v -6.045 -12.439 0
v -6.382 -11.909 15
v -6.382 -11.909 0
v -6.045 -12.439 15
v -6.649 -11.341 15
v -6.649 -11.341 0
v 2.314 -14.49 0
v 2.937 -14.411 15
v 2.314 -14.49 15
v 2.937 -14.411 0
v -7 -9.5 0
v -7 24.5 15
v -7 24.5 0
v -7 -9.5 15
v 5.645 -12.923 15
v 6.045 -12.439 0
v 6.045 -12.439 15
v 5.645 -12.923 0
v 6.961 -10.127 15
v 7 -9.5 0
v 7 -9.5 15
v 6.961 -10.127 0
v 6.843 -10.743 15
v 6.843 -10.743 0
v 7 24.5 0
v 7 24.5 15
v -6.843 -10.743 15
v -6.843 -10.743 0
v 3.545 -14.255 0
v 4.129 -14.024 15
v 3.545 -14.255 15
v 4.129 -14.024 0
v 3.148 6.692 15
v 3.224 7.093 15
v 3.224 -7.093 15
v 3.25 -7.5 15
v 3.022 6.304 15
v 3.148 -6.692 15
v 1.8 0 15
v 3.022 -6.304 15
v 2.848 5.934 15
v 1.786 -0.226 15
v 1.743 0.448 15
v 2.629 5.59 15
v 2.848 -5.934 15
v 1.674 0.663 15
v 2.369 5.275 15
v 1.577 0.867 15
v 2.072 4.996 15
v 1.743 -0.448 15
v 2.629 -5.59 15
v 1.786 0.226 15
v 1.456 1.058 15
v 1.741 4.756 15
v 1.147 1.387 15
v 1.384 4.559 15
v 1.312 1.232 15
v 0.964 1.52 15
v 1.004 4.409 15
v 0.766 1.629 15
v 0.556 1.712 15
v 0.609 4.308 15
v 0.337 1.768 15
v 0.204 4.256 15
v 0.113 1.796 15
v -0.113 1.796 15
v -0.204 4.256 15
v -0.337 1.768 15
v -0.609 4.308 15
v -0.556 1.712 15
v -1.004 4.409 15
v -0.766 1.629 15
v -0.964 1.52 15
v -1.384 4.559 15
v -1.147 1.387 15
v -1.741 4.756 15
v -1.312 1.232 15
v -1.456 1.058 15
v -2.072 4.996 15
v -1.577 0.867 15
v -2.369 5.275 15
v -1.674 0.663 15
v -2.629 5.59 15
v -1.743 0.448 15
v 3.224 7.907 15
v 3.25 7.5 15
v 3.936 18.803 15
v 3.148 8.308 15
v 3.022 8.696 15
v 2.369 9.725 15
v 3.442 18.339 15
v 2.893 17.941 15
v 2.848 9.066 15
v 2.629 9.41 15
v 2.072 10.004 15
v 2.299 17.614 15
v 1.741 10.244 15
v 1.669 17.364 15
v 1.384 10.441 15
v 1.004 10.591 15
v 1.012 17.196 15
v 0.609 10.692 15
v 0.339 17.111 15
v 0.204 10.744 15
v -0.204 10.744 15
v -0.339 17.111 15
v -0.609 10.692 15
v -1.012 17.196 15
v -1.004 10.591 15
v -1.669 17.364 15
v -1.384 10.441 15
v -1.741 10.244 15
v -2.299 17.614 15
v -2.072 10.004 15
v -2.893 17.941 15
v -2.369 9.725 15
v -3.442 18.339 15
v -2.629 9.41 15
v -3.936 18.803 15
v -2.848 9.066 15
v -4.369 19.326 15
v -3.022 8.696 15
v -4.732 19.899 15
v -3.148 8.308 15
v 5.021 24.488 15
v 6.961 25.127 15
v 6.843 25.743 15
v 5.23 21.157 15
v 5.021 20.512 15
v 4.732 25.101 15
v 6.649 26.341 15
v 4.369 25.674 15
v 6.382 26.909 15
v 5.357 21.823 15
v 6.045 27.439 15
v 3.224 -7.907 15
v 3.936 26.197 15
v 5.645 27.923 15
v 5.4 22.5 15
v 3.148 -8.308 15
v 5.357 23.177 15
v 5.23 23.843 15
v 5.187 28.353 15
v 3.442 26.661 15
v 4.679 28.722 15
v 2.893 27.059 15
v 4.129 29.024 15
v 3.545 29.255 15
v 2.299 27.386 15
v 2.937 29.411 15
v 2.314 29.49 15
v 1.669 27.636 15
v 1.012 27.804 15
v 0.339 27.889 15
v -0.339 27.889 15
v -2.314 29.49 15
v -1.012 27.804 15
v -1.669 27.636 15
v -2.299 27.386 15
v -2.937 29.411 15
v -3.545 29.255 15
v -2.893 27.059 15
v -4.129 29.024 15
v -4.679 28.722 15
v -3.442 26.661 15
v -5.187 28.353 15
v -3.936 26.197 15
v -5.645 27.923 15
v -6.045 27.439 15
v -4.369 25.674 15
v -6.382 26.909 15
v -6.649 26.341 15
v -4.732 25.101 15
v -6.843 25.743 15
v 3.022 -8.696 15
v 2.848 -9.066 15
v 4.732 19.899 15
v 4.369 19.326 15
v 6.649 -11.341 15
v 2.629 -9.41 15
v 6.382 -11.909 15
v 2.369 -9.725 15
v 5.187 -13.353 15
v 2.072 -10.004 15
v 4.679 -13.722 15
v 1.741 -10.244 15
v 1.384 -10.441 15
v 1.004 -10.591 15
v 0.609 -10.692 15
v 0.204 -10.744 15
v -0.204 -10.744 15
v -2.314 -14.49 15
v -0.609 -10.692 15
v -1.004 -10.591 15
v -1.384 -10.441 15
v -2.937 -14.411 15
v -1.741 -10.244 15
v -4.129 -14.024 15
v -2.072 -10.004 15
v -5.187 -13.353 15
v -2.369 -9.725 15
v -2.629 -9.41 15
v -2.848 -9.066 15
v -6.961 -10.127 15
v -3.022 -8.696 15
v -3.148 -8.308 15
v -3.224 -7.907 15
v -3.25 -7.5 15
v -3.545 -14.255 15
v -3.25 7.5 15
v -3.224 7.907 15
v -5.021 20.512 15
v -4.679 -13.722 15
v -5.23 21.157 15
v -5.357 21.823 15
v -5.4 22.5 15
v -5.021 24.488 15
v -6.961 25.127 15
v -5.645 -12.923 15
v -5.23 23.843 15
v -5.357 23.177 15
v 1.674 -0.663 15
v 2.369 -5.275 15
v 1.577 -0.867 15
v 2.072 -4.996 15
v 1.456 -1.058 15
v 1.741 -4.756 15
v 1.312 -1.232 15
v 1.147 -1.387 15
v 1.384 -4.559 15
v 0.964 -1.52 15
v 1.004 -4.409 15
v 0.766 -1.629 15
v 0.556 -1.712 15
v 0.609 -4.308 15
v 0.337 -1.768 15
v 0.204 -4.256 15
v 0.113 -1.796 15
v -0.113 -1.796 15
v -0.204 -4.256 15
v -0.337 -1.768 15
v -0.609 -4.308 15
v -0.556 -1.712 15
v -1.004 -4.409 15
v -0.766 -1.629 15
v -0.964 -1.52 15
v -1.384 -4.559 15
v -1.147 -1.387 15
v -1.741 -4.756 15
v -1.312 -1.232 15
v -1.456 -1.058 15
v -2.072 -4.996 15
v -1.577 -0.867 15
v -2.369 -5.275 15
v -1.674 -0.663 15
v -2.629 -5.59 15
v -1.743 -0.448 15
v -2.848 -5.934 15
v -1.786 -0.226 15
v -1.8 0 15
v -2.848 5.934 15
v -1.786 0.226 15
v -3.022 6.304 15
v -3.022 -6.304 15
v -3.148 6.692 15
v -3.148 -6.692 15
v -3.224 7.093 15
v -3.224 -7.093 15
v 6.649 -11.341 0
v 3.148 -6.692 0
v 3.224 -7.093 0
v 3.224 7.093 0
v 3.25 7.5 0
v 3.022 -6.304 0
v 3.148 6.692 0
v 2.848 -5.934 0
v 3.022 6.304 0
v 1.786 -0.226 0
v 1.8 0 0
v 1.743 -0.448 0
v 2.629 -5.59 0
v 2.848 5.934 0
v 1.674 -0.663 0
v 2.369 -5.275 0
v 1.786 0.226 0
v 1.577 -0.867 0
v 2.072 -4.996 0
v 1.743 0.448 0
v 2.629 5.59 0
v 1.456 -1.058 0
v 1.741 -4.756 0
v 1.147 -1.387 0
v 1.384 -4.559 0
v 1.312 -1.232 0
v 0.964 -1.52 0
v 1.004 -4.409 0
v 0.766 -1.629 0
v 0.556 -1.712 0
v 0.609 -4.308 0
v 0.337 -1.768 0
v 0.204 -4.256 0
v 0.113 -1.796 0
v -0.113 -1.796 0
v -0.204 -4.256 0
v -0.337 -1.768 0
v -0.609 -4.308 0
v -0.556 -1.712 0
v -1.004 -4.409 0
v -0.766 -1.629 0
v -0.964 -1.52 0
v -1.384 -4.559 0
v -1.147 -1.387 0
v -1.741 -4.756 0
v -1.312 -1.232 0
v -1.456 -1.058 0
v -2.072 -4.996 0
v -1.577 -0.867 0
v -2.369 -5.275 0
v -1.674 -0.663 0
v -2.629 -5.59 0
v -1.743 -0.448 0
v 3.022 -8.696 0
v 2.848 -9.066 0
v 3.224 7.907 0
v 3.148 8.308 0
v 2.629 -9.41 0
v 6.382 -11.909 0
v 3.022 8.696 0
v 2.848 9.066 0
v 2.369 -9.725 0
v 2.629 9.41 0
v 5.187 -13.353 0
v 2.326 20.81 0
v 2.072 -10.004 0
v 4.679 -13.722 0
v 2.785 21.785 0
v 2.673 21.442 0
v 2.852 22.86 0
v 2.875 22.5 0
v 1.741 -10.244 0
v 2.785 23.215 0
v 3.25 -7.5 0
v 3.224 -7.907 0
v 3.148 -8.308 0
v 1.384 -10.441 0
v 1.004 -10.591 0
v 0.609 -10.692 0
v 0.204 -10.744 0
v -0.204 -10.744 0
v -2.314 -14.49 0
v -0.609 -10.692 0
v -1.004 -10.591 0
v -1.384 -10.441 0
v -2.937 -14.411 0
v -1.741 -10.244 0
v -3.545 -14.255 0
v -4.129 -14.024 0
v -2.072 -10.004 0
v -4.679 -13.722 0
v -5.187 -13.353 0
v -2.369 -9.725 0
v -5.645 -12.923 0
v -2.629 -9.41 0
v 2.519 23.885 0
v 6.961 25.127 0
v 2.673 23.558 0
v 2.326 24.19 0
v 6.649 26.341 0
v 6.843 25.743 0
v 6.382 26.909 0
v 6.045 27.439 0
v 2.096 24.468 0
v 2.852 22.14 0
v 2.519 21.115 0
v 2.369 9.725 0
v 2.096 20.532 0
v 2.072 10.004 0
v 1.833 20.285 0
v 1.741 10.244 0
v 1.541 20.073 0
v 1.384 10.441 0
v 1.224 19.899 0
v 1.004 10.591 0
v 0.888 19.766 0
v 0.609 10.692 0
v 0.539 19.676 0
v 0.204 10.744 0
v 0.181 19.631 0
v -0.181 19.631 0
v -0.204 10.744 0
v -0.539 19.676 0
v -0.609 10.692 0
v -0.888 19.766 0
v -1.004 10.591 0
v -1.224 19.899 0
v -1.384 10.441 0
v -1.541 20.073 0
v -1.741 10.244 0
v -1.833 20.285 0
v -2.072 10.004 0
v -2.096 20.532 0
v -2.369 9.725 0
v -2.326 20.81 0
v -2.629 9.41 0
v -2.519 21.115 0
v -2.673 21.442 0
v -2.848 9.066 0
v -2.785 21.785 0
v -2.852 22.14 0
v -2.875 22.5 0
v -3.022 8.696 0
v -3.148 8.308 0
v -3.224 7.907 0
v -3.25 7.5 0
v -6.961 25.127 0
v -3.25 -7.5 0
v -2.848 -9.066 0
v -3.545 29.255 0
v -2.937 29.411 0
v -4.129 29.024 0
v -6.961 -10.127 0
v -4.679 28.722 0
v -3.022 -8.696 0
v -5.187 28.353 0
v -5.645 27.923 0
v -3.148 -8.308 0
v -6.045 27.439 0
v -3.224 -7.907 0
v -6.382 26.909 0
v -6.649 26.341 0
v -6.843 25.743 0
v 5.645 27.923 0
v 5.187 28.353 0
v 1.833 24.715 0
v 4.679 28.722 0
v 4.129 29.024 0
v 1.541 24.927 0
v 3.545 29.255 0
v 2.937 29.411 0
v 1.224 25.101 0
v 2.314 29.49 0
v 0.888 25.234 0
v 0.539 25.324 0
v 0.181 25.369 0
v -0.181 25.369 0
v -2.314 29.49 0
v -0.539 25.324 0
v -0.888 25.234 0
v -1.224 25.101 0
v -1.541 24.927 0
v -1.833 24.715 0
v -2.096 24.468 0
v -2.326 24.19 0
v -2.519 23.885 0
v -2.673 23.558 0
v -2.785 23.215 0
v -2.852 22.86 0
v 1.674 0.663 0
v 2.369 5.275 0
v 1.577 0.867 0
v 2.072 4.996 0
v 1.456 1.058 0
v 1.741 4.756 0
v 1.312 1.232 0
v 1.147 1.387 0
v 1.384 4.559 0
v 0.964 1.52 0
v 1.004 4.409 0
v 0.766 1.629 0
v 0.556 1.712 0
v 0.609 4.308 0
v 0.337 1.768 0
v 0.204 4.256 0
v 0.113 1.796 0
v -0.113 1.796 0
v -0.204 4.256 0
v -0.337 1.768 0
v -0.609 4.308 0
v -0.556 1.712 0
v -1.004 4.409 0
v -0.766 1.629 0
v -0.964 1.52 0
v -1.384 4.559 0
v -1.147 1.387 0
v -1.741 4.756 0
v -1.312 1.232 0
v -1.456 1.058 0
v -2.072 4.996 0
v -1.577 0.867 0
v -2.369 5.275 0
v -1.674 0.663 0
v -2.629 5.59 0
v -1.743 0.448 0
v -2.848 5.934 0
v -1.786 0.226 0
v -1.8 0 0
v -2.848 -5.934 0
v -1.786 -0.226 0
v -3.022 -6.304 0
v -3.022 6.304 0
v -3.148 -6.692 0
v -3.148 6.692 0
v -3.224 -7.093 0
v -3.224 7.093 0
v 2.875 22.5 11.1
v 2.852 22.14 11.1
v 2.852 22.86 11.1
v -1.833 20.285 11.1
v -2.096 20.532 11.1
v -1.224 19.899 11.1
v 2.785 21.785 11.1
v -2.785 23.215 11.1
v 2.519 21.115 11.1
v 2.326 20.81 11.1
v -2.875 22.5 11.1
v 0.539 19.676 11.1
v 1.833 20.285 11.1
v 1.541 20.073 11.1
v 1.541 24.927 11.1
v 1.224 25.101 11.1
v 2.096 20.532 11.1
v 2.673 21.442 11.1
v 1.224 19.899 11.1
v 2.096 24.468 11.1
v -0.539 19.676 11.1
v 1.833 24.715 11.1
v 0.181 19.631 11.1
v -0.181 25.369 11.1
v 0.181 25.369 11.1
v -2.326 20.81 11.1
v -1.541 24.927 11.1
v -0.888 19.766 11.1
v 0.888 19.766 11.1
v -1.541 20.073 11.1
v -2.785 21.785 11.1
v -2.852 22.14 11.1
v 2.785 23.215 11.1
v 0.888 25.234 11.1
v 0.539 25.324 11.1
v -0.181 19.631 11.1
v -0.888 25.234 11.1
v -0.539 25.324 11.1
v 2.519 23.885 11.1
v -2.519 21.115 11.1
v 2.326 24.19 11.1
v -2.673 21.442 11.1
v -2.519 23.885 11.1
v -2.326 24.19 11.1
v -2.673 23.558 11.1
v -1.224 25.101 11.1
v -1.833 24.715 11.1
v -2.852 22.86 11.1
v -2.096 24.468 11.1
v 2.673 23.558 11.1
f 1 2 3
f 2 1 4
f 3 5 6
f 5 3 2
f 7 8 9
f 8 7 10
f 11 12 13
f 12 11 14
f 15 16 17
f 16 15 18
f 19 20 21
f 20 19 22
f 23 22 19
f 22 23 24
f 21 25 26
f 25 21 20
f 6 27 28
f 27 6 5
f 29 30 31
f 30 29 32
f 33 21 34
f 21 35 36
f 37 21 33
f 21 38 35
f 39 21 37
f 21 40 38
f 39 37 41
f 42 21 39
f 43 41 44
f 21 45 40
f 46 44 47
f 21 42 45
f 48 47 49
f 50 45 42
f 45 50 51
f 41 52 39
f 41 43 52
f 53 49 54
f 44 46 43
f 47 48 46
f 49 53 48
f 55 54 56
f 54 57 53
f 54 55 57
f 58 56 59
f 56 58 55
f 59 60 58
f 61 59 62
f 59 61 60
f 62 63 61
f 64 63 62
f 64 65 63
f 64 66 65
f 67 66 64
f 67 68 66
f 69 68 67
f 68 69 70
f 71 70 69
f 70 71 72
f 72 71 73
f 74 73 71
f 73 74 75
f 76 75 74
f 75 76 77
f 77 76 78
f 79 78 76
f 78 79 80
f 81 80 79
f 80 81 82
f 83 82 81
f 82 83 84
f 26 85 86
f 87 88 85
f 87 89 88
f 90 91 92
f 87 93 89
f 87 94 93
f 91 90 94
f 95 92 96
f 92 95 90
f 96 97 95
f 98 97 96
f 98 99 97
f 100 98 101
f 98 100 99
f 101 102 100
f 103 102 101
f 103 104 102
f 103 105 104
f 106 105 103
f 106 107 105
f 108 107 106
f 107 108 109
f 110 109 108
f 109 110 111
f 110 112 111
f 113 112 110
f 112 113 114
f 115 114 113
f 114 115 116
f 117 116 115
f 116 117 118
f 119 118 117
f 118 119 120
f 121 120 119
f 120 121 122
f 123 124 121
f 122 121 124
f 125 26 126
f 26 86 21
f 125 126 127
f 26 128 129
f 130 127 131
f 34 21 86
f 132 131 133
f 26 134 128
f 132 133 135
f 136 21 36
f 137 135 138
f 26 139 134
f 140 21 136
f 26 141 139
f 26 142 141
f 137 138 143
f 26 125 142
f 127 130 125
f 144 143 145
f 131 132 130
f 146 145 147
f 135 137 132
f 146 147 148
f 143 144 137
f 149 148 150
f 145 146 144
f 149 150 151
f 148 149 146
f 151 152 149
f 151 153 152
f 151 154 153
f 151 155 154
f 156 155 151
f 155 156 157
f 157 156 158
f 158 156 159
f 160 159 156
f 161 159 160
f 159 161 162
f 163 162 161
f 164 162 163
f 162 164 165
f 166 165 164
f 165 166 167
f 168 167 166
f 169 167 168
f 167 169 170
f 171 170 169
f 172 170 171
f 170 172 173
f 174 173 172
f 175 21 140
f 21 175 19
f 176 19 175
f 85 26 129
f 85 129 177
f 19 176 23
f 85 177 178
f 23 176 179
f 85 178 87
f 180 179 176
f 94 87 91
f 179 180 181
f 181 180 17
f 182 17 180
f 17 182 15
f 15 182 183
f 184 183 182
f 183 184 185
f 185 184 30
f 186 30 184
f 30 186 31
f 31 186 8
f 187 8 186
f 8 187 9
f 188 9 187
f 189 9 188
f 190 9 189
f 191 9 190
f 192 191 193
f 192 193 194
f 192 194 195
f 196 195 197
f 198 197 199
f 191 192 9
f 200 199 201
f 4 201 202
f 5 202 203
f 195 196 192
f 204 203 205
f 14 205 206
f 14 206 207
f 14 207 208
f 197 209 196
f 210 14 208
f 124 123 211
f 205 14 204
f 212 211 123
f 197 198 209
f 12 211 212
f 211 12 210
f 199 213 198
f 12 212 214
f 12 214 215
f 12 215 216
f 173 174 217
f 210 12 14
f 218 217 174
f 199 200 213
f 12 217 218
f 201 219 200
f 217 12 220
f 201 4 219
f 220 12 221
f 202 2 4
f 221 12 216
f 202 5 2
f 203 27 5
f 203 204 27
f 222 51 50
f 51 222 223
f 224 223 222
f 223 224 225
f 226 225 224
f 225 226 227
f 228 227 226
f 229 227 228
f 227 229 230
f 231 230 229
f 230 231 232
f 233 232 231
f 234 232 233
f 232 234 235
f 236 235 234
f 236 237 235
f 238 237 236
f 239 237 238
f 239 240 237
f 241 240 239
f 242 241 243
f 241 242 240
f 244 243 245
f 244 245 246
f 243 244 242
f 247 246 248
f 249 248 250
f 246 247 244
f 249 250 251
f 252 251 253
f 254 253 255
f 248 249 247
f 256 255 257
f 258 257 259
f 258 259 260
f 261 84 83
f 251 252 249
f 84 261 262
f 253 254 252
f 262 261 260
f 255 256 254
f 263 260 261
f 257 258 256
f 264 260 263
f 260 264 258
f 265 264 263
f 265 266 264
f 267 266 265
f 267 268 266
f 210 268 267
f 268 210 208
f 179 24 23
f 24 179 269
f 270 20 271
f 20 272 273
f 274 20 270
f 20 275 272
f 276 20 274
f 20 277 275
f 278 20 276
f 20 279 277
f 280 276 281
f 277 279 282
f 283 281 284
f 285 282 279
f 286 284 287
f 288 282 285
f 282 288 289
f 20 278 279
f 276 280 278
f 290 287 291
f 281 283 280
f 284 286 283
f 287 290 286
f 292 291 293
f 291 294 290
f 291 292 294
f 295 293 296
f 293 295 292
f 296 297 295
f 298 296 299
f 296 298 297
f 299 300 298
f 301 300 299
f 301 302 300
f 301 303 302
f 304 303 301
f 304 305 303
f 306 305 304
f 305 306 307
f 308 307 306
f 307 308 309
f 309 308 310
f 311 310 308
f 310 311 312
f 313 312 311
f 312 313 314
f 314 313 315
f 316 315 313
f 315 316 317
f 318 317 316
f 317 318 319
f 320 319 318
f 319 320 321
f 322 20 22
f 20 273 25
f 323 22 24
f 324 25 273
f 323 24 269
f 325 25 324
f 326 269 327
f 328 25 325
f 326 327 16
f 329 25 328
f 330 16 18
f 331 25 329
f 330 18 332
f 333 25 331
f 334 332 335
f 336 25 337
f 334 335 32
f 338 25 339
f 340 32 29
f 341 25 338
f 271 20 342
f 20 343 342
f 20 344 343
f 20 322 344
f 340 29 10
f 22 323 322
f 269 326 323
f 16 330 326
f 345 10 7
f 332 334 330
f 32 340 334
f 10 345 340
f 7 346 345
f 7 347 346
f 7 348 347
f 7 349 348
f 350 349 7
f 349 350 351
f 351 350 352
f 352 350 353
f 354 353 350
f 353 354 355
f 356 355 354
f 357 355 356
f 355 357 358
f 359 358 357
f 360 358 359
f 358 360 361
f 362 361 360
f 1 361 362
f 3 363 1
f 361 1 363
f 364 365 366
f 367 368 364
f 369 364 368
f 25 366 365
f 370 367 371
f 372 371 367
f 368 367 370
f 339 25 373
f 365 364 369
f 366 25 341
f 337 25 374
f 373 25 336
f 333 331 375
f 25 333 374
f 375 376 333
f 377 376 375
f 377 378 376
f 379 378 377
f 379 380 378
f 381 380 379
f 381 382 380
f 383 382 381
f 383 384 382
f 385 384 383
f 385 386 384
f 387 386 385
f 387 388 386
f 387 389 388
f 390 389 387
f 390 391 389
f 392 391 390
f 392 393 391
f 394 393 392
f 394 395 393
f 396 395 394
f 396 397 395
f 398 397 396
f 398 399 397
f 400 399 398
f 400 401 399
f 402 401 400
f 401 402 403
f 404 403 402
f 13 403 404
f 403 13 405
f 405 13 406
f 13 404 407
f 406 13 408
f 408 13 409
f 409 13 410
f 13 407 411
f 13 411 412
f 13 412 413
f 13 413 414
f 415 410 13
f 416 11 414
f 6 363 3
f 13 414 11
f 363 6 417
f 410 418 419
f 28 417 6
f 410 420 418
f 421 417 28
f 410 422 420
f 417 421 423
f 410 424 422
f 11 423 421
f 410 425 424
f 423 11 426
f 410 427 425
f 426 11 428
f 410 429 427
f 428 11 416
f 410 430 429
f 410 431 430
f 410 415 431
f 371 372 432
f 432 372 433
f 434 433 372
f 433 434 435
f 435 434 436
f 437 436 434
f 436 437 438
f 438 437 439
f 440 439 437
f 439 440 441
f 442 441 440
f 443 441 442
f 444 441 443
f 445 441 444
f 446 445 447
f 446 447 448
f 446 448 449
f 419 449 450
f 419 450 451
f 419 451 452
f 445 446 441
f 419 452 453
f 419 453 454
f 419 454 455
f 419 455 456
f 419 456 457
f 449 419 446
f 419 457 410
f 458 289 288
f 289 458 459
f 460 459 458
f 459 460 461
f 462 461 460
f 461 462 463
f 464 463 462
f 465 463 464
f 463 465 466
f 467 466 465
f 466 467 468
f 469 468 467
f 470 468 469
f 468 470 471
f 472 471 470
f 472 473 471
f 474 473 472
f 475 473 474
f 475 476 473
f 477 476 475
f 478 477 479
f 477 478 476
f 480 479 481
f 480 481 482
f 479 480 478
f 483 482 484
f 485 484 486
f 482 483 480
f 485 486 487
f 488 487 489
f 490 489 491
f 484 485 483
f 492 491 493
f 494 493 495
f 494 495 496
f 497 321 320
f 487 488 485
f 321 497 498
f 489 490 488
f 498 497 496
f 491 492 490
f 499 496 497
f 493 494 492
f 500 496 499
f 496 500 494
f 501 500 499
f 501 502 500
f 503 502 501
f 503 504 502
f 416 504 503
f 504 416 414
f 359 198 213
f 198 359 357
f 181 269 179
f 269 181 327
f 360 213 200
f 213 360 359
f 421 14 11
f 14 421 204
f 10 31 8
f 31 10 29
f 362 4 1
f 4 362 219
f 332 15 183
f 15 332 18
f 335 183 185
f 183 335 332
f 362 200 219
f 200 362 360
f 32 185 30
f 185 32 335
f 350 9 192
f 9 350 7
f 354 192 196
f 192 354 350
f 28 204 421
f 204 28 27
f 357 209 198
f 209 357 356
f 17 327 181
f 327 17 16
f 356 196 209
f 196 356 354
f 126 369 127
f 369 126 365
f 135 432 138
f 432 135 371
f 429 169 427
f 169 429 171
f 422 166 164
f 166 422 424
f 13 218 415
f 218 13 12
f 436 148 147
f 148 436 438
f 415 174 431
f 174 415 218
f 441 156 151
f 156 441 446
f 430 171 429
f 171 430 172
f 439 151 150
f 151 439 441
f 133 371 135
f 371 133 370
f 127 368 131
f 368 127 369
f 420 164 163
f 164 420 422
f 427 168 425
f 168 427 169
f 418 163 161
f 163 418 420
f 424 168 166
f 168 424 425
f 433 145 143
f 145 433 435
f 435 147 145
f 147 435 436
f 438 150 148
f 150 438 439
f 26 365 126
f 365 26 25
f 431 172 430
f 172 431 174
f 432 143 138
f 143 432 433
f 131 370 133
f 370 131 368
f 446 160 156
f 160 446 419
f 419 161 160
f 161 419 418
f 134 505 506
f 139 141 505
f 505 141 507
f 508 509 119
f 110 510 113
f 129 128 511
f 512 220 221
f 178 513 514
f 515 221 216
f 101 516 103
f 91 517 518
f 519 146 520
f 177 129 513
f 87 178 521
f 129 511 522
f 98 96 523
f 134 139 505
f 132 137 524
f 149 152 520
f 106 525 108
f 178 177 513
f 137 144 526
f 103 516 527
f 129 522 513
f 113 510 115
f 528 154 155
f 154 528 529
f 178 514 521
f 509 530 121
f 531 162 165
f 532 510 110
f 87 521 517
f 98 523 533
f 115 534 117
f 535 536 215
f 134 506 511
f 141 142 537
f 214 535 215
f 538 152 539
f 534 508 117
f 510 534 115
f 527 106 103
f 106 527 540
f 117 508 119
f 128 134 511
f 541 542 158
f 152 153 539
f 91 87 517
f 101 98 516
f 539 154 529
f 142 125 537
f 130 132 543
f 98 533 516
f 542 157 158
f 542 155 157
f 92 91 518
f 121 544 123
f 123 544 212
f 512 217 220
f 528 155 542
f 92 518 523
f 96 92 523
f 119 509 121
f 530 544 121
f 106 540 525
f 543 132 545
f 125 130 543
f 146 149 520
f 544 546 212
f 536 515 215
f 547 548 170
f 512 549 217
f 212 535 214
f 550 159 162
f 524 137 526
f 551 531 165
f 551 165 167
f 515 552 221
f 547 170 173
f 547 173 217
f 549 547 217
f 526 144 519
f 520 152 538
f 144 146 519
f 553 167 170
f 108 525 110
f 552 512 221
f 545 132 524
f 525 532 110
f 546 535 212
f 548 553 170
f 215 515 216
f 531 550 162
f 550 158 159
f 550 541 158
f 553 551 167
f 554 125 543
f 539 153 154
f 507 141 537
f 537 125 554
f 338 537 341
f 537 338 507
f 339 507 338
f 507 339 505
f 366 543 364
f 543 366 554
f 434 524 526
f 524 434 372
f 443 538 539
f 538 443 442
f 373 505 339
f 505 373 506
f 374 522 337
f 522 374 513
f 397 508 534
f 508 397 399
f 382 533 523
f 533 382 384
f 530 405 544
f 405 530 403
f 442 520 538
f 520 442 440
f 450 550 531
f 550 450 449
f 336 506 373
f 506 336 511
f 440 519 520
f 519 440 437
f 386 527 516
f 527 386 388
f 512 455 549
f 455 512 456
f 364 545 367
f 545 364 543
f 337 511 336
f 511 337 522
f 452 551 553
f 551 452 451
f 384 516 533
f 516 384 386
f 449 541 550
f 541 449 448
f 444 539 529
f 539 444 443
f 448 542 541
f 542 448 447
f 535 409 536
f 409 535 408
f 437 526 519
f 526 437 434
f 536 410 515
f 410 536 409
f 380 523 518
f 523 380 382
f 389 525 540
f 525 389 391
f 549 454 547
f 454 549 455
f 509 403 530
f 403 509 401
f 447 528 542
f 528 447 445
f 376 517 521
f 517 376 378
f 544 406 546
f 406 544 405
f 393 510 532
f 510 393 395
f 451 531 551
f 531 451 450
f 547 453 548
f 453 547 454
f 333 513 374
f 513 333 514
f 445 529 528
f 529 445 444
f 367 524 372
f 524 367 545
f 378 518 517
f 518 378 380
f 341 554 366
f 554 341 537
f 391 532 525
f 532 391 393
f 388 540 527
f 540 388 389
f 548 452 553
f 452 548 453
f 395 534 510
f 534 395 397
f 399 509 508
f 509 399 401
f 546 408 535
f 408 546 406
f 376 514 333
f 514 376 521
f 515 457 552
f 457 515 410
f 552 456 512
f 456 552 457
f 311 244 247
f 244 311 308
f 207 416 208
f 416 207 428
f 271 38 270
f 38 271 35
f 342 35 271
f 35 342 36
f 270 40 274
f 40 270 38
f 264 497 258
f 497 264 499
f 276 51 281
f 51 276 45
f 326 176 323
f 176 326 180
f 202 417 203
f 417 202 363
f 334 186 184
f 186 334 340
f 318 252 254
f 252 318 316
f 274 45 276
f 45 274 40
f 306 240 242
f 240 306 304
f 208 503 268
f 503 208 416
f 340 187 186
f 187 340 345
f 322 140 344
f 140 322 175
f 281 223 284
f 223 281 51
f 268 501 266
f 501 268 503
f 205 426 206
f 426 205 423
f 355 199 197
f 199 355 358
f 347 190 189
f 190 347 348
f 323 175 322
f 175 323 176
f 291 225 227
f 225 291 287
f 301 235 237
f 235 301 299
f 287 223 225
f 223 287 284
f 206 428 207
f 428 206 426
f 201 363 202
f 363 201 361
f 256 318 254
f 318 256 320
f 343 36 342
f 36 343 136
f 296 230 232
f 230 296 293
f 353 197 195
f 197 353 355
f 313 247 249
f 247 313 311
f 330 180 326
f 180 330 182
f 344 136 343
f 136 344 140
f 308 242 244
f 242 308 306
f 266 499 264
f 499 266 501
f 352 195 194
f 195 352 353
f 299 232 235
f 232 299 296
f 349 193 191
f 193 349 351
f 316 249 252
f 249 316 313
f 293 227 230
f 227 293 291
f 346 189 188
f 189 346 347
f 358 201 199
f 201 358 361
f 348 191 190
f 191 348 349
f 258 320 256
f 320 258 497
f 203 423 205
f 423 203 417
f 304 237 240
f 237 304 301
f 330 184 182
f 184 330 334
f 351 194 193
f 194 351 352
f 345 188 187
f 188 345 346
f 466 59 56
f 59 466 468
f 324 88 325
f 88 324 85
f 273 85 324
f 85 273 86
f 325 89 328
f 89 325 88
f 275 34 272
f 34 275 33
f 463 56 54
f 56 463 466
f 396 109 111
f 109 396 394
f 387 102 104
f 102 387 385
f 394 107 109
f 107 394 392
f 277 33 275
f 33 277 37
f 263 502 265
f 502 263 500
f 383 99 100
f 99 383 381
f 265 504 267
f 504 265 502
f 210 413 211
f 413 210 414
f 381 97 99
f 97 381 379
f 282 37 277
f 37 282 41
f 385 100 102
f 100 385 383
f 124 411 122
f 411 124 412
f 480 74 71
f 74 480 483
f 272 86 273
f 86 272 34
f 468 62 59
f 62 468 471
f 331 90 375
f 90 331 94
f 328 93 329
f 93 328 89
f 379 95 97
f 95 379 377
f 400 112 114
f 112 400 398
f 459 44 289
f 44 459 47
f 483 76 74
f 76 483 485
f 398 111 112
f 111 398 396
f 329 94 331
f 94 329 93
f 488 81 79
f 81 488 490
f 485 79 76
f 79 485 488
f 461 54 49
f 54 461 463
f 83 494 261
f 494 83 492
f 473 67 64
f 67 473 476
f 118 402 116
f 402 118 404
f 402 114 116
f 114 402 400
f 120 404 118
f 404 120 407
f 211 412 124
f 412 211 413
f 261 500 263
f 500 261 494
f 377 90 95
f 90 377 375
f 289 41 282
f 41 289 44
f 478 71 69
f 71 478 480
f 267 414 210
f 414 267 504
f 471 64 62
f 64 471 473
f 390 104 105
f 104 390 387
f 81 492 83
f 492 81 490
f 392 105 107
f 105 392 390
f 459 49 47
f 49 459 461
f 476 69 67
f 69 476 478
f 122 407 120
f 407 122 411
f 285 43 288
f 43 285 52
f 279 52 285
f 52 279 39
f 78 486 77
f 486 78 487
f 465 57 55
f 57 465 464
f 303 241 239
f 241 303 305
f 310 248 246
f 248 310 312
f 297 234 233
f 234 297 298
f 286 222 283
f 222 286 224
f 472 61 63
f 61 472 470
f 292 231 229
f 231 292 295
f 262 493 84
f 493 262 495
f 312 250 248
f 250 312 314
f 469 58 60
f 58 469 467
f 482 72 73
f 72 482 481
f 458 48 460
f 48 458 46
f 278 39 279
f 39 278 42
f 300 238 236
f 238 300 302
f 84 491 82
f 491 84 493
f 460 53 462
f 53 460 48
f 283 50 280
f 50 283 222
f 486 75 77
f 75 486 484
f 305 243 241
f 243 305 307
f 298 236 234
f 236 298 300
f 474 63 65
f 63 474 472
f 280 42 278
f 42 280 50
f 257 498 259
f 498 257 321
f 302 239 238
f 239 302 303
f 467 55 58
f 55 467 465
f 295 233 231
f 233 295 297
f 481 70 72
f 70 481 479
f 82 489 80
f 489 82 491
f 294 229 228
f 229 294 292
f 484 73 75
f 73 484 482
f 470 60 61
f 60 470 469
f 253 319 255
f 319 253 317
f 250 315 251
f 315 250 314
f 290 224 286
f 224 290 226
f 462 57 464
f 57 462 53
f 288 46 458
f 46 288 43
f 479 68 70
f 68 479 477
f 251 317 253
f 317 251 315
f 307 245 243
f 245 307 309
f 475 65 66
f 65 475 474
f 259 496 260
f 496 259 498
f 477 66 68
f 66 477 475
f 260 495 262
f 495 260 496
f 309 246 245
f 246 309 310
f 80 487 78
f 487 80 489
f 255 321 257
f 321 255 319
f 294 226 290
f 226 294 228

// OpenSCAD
$fn = 50;


difference() {
	union() {
		hull() {
			translate(v = [-2.0000000000, 9.5000000000, 0]) {
				cylinder(h = 15, r = 5);
			}
			translate(v = [2.0000000000, 9.5000000000, 0]) {
				cylinder(h = 15, r = 5);
			}
			translate(v = [-2.0000000000, -9.5000000000, 0]) {
				cylinder(h = 15, r = 5);
			}
			translate(v = [2.0000000000, -9.5000000000, 0]) {
				cylinder(h = 15, r = 5);
			}
		}
		translate(v = [0.0000000000, 15.0000000000, 0]) {
			hull() {
				translate(v = [-2.0000000000, 9.5000000000, 0]) {
					cylinder(h = 15, r = 5);
				}
				translate(v = [2.0000000000, 9.5000000000, 0]) {
					cylinder(h = 15, r = 5);
				}
				translate(v = [-2.0000000000, -9.5000000000, 0]) {
					cylinder(h = 15, r = 5);
				}
				translate(v = [2.0000000000, -9.5000000000, 0]) {
					cylinder(h = 15, r = 5);
				}
			}
		}
		translate(v = [0.0000000000, 15.0000000000, 0]) {
			hull() {
				translate(v = [-2.0000000000, 9.5000000000, 0]) {
					cylinder(h = 15, r = 5);
				}
				translate(v = [2.0000000000, 9.5000000000, 0]) {
					cylinder(h = 15, r = 5);
				}
				translate(v = [-2.0000000000, -9.5000000000, 0]) {
					cylinder(h = 15, r = 5);
				}
				translate(v = [2.0000000000, -9.5000000000, 0]) {
					cylinder(h = 15, r = 5);
				}
			}
		}
	}
	union() {
		translate(v = [0.0000000000, 22.5000000000, 15]) {
			rotate(a = [0, 0, 0]) {
				difference() {
					union() {
						#translate(v = [0, 0, -15.0000000000]) {
							cylinder(h = 15, r = 2.6000000000);
						}
						#translate(v = [0, 0, -3.9000000000]) {
							cylinder(h = 3.9000000000, r1 = 2.8750000000, r2 = 5.4000000000);
						}
						#translate(v = [0, 0, -15.0000000000]) {
							cylinder(h = 15, r = 2.8750000000);
						}
						#translate(v = [0, 0, -15.0000000000]) {
							cylinder(h = 15, r = 2.6000000000);
						}
					}
					union();
				}
			}
		}
		translate(v = [0.0000000000, 22.5000000000, 15]) {
			rotate(a = [0, 0, 0]) {
				difference() {
					union() {
						#translate(v = [0, 0, -15.0000000000]) {
							cylinder(h = 15, r = 2.6000000000);
						}
						#translate(v = [0, 0, -3.9000000000]) {
							cylinder(h = 3.9000000000, r1 = 2.8750000000, r2 = 5.4000000000);
						}
						#translate(v = [0, 0, -15.0000000000]) {
							cylinder(h = 15, r = 2.8750000000);
						}
						#translate(v = [0, 0, -15.0000000000]) {
							cylinder(h = 15, r = 2.6000000000);
						}
					}
					union();
				}
			}
		}
		translate(v = [0.0000000000, -7.5000000000, 0]) {
			translate(v = [0, 0, -100]) {
				cylinder(h = 200, r = 3.2500000000);
			}
		}
		translate(v = [0.0000000000, 7.5000000000, 0]) {
			translate(v = [0, 0, -100]) {
				cylinder(h = 200, r = 3.2500000000);
			}
		}
		translate(v = [0.0000000000, -7.5000000000, 0]) {
			translate(v = [0, 0, -100]) {
				cylinder(h = 200, r = 1.8000000000);
			}
		}
		translate(v = [0, 0, -100]) {
			cylinder(h = 200, r = 1.8000000000);
		}
		translate(v = [0.0000000000, 7.5000000000, 0]) {
			translate(v = [0, 0, -100]) {
				cylinder(h = 200, r = 1.8000000000);
			}
		}
	}
}
